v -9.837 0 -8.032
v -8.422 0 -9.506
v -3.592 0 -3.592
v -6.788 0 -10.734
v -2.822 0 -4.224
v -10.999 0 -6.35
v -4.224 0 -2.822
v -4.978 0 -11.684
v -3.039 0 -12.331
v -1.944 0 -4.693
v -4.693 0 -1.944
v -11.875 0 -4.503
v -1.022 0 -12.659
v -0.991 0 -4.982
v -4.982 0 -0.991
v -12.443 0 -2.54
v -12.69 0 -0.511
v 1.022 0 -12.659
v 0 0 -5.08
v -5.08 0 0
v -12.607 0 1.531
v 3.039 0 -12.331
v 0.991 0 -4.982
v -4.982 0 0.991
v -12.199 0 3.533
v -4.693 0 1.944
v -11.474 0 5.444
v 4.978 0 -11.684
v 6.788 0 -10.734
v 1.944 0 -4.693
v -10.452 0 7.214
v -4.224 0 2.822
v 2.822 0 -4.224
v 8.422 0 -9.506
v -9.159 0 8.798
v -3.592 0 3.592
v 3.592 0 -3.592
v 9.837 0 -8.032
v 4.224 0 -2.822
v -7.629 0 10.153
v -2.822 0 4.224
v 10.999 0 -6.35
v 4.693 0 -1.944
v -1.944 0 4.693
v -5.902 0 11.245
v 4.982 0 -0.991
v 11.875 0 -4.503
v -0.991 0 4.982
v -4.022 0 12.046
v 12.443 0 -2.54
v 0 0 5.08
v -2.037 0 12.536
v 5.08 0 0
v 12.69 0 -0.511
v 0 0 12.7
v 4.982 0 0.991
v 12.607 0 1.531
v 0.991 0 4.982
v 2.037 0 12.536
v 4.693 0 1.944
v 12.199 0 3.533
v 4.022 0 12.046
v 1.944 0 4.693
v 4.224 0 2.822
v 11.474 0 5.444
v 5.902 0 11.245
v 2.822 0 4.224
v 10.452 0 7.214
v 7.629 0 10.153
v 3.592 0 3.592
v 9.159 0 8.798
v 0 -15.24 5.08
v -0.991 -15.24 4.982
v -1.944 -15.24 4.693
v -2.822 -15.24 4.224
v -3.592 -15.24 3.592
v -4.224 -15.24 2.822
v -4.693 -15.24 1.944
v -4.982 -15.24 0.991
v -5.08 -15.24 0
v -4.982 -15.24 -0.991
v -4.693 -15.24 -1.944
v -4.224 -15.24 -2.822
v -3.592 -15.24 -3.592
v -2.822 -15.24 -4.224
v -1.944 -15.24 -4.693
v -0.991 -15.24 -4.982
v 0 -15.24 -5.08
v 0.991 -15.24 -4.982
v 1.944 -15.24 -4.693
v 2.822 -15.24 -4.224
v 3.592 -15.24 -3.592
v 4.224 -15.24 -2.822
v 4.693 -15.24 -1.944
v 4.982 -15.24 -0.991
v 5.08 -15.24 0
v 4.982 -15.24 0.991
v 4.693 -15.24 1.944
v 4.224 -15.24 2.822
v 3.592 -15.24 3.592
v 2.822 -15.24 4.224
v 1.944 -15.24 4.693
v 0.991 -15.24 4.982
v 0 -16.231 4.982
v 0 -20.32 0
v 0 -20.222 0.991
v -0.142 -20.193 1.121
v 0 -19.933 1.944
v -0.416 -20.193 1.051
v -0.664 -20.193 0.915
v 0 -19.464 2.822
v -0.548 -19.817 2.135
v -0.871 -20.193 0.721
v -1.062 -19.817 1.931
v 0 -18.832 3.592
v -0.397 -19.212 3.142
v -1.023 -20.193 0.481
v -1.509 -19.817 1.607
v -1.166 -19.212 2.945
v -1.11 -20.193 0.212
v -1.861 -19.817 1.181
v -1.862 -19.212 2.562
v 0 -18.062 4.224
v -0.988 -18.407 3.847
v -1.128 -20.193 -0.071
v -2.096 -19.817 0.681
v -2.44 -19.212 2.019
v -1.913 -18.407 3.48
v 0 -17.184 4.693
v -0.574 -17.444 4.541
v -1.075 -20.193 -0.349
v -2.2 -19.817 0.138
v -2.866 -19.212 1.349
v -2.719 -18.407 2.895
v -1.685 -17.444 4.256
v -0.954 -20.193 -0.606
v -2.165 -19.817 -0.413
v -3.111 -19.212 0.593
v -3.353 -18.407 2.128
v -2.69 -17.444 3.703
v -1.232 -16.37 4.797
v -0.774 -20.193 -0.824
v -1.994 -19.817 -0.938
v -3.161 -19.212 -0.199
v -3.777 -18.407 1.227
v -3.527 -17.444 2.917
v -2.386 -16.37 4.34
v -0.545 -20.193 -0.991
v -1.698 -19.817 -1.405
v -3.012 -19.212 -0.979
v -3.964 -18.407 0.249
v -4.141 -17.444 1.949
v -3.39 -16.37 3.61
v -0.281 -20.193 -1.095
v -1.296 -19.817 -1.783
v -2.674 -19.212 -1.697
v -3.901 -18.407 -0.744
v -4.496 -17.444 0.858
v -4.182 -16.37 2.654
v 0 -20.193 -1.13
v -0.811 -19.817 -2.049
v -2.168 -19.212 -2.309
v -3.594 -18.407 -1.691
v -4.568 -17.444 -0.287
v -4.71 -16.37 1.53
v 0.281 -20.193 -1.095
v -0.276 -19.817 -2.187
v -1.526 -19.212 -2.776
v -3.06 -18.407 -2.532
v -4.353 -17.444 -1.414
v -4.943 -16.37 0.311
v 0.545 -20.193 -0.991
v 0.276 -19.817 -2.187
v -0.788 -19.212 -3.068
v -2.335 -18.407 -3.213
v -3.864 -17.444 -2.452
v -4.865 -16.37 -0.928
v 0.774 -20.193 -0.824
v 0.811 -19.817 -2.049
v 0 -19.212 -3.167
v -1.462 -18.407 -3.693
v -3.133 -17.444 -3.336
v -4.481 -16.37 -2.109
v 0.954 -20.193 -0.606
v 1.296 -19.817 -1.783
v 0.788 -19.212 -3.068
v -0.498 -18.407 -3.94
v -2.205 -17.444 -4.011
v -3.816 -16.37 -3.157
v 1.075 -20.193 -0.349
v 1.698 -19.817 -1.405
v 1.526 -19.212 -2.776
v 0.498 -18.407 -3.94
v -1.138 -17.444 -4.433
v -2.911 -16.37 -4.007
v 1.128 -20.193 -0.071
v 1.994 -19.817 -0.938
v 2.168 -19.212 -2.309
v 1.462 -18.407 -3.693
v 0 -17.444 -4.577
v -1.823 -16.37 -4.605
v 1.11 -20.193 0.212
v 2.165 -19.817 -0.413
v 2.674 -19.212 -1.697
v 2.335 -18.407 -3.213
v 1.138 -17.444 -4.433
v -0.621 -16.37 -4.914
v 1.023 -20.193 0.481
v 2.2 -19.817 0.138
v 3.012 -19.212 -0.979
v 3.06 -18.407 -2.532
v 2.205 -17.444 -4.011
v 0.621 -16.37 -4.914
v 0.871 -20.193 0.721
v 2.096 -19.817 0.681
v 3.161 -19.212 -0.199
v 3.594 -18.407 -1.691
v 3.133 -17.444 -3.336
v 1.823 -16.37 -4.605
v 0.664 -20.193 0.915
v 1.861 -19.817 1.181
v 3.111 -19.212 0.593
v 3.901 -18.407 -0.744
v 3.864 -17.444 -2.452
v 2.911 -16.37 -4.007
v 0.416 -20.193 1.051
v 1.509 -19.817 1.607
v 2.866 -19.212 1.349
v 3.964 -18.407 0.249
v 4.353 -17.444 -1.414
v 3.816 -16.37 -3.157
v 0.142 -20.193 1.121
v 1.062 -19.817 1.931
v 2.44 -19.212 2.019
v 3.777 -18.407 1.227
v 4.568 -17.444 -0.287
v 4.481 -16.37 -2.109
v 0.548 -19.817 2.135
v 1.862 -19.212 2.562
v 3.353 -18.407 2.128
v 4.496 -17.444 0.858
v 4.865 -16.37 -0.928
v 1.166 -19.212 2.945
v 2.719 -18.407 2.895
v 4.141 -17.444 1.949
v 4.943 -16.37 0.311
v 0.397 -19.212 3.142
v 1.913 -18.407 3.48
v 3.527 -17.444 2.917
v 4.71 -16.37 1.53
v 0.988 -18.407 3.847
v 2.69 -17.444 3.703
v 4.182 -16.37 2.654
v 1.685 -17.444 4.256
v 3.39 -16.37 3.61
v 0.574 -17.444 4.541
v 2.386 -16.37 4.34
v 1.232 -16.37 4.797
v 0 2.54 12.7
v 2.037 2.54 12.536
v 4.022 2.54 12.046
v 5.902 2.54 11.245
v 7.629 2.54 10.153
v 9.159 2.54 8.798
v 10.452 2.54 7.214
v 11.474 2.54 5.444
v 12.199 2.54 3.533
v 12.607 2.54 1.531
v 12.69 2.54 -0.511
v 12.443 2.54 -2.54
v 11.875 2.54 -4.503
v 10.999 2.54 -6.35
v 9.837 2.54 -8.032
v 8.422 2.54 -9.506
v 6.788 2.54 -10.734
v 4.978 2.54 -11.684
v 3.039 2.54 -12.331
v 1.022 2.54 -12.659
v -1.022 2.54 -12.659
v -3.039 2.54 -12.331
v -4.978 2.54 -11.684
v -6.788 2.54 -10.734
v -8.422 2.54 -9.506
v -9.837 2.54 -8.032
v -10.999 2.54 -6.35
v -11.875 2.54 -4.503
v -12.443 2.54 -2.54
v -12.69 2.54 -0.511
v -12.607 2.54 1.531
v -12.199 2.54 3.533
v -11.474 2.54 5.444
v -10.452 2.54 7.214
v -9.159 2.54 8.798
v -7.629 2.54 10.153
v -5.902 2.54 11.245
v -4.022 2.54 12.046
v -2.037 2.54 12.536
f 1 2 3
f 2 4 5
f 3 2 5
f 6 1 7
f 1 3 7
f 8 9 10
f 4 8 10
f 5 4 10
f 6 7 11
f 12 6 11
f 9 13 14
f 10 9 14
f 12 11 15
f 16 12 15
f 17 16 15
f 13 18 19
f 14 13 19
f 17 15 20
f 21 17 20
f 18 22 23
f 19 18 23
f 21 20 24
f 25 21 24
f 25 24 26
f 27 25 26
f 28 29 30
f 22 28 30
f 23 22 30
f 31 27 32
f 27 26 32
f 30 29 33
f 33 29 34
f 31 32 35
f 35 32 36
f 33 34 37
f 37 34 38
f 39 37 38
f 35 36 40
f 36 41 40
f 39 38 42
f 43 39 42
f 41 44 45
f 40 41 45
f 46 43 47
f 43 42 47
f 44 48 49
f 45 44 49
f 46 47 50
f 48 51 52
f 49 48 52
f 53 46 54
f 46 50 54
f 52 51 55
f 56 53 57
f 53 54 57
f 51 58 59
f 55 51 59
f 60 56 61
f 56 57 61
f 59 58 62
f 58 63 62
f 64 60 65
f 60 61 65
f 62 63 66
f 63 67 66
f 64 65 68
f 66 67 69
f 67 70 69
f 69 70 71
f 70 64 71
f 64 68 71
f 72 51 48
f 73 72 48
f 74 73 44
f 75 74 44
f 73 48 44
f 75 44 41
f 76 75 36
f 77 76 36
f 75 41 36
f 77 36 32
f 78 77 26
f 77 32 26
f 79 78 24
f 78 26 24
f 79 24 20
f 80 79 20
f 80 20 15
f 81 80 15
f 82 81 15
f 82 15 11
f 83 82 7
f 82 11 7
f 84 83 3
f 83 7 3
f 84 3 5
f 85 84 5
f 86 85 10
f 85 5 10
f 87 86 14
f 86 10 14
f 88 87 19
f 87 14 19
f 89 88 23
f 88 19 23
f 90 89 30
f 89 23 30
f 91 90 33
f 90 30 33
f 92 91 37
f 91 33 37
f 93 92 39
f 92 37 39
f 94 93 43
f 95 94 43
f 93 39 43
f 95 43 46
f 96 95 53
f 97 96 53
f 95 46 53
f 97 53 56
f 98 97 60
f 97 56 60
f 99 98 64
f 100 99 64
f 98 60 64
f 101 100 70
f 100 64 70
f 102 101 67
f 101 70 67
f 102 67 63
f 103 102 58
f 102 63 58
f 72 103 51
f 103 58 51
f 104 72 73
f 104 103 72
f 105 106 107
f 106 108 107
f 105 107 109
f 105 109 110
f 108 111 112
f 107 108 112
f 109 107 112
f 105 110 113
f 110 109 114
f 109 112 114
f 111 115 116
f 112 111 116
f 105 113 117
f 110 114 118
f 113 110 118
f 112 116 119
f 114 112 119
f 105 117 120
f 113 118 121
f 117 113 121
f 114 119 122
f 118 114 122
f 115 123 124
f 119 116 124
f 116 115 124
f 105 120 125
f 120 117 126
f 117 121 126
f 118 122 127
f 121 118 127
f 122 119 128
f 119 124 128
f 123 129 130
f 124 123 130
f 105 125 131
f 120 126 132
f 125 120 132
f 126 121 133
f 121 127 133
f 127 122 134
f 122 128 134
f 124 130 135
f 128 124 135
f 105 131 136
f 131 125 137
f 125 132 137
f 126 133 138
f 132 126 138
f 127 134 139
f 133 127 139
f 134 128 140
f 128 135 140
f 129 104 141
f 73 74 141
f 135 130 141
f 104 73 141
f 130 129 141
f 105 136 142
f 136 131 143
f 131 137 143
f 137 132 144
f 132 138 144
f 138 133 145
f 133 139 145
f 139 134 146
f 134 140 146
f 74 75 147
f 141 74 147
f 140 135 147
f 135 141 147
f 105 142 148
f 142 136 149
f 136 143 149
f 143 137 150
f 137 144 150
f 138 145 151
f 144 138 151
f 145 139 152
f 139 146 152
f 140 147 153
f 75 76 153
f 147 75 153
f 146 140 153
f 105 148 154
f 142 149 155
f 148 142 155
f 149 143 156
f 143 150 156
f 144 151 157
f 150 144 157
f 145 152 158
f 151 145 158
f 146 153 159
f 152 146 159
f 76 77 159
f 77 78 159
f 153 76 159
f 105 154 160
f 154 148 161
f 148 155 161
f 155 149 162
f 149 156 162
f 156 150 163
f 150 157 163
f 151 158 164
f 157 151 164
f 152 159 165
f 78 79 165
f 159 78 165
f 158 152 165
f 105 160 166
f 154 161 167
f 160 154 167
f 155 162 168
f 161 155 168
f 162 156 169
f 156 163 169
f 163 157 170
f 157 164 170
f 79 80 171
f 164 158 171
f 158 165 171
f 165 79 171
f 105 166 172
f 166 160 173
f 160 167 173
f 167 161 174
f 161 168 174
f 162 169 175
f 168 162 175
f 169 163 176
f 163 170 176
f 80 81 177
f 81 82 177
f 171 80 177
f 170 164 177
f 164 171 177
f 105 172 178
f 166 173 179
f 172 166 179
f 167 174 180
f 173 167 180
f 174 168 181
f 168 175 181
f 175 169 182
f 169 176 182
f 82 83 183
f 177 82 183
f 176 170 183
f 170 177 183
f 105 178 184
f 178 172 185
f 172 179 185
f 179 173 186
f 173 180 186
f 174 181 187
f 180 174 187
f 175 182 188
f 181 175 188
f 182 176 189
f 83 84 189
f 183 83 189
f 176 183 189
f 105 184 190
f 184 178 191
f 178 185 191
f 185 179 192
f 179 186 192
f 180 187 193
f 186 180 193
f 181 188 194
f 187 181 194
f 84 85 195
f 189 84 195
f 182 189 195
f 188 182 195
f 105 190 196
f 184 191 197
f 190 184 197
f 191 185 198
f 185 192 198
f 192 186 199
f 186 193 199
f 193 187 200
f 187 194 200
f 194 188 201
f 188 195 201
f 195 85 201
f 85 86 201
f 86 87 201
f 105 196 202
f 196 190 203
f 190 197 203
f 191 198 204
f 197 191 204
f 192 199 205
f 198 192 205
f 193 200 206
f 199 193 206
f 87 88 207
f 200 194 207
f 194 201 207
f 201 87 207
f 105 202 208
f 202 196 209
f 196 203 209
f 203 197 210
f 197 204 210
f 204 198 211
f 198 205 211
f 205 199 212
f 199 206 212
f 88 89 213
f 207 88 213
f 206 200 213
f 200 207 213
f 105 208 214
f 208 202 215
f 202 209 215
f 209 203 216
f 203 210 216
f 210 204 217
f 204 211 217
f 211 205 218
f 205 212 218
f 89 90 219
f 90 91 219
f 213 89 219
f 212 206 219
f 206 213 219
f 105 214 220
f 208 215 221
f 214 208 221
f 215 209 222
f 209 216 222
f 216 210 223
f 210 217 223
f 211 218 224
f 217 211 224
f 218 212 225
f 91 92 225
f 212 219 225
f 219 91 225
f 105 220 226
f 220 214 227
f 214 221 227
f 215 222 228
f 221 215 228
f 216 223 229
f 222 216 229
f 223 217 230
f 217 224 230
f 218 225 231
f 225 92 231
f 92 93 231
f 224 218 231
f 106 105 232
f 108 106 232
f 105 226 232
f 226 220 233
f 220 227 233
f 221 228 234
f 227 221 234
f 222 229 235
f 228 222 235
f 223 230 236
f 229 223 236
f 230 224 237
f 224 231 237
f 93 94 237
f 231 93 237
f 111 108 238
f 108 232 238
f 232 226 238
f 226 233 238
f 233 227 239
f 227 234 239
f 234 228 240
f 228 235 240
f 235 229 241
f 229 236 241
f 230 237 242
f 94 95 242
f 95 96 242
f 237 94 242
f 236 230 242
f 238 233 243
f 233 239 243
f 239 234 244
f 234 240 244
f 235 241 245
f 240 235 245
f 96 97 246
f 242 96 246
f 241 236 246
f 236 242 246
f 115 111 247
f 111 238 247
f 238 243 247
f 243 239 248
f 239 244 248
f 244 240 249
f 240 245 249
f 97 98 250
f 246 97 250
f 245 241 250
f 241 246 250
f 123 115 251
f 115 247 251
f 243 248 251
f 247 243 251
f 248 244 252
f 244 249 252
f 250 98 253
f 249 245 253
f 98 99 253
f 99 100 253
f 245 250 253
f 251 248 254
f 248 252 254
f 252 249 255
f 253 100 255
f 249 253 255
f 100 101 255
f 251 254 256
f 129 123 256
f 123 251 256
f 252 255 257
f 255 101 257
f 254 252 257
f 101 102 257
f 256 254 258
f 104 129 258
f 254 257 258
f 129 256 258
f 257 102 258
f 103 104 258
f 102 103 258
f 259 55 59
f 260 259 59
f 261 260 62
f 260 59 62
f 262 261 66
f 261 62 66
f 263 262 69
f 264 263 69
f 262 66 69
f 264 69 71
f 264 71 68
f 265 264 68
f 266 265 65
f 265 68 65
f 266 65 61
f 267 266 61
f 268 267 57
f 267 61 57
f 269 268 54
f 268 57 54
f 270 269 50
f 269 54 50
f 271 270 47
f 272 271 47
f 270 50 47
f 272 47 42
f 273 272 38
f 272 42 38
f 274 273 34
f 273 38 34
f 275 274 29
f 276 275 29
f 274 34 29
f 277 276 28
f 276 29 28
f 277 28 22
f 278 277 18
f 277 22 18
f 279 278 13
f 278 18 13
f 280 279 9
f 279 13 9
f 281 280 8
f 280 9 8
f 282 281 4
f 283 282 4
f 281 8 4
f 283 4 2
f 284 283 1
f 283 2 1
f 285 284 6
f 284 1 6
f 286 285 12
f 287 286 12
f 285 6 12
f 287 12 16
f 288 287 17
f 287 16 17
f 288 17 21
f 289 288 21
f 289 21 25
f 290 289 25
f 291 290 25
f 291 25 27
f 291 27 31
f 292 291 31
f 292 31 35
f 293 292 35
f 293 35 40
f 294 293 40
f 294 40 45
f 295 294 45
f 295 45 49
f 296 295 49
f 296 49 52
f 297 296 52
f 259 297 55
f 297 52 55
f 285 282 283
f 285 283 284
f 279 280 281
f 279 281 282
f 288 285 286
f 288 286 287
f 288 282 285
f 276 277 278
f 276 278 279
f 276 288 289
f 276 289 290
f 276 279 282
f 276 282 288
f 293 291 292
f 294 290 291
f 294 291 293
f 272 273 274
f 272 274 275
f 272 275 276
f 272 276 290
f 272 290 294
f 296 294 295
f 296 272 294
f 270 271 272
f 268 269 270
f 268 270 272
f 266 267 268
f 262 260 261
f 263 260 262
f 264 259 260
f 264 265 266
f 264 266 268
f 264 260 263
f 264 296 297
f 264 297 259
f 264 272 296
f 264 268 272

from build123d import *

# Parameters (mm, degrees)
SKETCH1_R           = 12.7
BOSS_EXTRUDE1_DEPTH = 2.54
SKETCH3_R           = 5.08
BOSS_EXTRUDE2_DEPTH = 15.24


with BuildPart() as part:
    # Sketch1 → Boss-Extrude1 (new body)
    with BuildSketch(Plane(origin=(0, 0, 0), x_dir=(1, 0, 0), z_dir=(0, 1, 0))):
        with Locations(Location((0, 0, 0), (0, 0, 270))):
            Circle(SKETCH1_R)
    extrude(amount=BOSS_EXTRUDE1_DEPTH)

    # Sketch3 → Boss-Extrude2 (add)
    with BuildSketch(Plane.XZ):
        with Locations(Location((0, 0, 0), (0, 0, 90))):
            Circle(SKETCH3_R)
    extrude(amount=BOSS_EXTRUDE2_DEPTH)

    # Sketch5 → Revolve2 (revolve)
    with BuildSketch(Plane(origin=(0, 0, 0), x_dir=(0, 0, -1), z_dir=(1, 0, 0))):
        with BuildLine():
            Line((0, -15.24), (0, -20.32))
            ThreePointArc((0, -20.32), (-3.592102448, -18.832102448), (-5.08, -15.24))
            Line((-5.08, -15.24), (0, -15.24))
        make_face()
    revolve(axis=Axis((0, -15.24, 0), (0, -1, 0)))


solid = part.part
